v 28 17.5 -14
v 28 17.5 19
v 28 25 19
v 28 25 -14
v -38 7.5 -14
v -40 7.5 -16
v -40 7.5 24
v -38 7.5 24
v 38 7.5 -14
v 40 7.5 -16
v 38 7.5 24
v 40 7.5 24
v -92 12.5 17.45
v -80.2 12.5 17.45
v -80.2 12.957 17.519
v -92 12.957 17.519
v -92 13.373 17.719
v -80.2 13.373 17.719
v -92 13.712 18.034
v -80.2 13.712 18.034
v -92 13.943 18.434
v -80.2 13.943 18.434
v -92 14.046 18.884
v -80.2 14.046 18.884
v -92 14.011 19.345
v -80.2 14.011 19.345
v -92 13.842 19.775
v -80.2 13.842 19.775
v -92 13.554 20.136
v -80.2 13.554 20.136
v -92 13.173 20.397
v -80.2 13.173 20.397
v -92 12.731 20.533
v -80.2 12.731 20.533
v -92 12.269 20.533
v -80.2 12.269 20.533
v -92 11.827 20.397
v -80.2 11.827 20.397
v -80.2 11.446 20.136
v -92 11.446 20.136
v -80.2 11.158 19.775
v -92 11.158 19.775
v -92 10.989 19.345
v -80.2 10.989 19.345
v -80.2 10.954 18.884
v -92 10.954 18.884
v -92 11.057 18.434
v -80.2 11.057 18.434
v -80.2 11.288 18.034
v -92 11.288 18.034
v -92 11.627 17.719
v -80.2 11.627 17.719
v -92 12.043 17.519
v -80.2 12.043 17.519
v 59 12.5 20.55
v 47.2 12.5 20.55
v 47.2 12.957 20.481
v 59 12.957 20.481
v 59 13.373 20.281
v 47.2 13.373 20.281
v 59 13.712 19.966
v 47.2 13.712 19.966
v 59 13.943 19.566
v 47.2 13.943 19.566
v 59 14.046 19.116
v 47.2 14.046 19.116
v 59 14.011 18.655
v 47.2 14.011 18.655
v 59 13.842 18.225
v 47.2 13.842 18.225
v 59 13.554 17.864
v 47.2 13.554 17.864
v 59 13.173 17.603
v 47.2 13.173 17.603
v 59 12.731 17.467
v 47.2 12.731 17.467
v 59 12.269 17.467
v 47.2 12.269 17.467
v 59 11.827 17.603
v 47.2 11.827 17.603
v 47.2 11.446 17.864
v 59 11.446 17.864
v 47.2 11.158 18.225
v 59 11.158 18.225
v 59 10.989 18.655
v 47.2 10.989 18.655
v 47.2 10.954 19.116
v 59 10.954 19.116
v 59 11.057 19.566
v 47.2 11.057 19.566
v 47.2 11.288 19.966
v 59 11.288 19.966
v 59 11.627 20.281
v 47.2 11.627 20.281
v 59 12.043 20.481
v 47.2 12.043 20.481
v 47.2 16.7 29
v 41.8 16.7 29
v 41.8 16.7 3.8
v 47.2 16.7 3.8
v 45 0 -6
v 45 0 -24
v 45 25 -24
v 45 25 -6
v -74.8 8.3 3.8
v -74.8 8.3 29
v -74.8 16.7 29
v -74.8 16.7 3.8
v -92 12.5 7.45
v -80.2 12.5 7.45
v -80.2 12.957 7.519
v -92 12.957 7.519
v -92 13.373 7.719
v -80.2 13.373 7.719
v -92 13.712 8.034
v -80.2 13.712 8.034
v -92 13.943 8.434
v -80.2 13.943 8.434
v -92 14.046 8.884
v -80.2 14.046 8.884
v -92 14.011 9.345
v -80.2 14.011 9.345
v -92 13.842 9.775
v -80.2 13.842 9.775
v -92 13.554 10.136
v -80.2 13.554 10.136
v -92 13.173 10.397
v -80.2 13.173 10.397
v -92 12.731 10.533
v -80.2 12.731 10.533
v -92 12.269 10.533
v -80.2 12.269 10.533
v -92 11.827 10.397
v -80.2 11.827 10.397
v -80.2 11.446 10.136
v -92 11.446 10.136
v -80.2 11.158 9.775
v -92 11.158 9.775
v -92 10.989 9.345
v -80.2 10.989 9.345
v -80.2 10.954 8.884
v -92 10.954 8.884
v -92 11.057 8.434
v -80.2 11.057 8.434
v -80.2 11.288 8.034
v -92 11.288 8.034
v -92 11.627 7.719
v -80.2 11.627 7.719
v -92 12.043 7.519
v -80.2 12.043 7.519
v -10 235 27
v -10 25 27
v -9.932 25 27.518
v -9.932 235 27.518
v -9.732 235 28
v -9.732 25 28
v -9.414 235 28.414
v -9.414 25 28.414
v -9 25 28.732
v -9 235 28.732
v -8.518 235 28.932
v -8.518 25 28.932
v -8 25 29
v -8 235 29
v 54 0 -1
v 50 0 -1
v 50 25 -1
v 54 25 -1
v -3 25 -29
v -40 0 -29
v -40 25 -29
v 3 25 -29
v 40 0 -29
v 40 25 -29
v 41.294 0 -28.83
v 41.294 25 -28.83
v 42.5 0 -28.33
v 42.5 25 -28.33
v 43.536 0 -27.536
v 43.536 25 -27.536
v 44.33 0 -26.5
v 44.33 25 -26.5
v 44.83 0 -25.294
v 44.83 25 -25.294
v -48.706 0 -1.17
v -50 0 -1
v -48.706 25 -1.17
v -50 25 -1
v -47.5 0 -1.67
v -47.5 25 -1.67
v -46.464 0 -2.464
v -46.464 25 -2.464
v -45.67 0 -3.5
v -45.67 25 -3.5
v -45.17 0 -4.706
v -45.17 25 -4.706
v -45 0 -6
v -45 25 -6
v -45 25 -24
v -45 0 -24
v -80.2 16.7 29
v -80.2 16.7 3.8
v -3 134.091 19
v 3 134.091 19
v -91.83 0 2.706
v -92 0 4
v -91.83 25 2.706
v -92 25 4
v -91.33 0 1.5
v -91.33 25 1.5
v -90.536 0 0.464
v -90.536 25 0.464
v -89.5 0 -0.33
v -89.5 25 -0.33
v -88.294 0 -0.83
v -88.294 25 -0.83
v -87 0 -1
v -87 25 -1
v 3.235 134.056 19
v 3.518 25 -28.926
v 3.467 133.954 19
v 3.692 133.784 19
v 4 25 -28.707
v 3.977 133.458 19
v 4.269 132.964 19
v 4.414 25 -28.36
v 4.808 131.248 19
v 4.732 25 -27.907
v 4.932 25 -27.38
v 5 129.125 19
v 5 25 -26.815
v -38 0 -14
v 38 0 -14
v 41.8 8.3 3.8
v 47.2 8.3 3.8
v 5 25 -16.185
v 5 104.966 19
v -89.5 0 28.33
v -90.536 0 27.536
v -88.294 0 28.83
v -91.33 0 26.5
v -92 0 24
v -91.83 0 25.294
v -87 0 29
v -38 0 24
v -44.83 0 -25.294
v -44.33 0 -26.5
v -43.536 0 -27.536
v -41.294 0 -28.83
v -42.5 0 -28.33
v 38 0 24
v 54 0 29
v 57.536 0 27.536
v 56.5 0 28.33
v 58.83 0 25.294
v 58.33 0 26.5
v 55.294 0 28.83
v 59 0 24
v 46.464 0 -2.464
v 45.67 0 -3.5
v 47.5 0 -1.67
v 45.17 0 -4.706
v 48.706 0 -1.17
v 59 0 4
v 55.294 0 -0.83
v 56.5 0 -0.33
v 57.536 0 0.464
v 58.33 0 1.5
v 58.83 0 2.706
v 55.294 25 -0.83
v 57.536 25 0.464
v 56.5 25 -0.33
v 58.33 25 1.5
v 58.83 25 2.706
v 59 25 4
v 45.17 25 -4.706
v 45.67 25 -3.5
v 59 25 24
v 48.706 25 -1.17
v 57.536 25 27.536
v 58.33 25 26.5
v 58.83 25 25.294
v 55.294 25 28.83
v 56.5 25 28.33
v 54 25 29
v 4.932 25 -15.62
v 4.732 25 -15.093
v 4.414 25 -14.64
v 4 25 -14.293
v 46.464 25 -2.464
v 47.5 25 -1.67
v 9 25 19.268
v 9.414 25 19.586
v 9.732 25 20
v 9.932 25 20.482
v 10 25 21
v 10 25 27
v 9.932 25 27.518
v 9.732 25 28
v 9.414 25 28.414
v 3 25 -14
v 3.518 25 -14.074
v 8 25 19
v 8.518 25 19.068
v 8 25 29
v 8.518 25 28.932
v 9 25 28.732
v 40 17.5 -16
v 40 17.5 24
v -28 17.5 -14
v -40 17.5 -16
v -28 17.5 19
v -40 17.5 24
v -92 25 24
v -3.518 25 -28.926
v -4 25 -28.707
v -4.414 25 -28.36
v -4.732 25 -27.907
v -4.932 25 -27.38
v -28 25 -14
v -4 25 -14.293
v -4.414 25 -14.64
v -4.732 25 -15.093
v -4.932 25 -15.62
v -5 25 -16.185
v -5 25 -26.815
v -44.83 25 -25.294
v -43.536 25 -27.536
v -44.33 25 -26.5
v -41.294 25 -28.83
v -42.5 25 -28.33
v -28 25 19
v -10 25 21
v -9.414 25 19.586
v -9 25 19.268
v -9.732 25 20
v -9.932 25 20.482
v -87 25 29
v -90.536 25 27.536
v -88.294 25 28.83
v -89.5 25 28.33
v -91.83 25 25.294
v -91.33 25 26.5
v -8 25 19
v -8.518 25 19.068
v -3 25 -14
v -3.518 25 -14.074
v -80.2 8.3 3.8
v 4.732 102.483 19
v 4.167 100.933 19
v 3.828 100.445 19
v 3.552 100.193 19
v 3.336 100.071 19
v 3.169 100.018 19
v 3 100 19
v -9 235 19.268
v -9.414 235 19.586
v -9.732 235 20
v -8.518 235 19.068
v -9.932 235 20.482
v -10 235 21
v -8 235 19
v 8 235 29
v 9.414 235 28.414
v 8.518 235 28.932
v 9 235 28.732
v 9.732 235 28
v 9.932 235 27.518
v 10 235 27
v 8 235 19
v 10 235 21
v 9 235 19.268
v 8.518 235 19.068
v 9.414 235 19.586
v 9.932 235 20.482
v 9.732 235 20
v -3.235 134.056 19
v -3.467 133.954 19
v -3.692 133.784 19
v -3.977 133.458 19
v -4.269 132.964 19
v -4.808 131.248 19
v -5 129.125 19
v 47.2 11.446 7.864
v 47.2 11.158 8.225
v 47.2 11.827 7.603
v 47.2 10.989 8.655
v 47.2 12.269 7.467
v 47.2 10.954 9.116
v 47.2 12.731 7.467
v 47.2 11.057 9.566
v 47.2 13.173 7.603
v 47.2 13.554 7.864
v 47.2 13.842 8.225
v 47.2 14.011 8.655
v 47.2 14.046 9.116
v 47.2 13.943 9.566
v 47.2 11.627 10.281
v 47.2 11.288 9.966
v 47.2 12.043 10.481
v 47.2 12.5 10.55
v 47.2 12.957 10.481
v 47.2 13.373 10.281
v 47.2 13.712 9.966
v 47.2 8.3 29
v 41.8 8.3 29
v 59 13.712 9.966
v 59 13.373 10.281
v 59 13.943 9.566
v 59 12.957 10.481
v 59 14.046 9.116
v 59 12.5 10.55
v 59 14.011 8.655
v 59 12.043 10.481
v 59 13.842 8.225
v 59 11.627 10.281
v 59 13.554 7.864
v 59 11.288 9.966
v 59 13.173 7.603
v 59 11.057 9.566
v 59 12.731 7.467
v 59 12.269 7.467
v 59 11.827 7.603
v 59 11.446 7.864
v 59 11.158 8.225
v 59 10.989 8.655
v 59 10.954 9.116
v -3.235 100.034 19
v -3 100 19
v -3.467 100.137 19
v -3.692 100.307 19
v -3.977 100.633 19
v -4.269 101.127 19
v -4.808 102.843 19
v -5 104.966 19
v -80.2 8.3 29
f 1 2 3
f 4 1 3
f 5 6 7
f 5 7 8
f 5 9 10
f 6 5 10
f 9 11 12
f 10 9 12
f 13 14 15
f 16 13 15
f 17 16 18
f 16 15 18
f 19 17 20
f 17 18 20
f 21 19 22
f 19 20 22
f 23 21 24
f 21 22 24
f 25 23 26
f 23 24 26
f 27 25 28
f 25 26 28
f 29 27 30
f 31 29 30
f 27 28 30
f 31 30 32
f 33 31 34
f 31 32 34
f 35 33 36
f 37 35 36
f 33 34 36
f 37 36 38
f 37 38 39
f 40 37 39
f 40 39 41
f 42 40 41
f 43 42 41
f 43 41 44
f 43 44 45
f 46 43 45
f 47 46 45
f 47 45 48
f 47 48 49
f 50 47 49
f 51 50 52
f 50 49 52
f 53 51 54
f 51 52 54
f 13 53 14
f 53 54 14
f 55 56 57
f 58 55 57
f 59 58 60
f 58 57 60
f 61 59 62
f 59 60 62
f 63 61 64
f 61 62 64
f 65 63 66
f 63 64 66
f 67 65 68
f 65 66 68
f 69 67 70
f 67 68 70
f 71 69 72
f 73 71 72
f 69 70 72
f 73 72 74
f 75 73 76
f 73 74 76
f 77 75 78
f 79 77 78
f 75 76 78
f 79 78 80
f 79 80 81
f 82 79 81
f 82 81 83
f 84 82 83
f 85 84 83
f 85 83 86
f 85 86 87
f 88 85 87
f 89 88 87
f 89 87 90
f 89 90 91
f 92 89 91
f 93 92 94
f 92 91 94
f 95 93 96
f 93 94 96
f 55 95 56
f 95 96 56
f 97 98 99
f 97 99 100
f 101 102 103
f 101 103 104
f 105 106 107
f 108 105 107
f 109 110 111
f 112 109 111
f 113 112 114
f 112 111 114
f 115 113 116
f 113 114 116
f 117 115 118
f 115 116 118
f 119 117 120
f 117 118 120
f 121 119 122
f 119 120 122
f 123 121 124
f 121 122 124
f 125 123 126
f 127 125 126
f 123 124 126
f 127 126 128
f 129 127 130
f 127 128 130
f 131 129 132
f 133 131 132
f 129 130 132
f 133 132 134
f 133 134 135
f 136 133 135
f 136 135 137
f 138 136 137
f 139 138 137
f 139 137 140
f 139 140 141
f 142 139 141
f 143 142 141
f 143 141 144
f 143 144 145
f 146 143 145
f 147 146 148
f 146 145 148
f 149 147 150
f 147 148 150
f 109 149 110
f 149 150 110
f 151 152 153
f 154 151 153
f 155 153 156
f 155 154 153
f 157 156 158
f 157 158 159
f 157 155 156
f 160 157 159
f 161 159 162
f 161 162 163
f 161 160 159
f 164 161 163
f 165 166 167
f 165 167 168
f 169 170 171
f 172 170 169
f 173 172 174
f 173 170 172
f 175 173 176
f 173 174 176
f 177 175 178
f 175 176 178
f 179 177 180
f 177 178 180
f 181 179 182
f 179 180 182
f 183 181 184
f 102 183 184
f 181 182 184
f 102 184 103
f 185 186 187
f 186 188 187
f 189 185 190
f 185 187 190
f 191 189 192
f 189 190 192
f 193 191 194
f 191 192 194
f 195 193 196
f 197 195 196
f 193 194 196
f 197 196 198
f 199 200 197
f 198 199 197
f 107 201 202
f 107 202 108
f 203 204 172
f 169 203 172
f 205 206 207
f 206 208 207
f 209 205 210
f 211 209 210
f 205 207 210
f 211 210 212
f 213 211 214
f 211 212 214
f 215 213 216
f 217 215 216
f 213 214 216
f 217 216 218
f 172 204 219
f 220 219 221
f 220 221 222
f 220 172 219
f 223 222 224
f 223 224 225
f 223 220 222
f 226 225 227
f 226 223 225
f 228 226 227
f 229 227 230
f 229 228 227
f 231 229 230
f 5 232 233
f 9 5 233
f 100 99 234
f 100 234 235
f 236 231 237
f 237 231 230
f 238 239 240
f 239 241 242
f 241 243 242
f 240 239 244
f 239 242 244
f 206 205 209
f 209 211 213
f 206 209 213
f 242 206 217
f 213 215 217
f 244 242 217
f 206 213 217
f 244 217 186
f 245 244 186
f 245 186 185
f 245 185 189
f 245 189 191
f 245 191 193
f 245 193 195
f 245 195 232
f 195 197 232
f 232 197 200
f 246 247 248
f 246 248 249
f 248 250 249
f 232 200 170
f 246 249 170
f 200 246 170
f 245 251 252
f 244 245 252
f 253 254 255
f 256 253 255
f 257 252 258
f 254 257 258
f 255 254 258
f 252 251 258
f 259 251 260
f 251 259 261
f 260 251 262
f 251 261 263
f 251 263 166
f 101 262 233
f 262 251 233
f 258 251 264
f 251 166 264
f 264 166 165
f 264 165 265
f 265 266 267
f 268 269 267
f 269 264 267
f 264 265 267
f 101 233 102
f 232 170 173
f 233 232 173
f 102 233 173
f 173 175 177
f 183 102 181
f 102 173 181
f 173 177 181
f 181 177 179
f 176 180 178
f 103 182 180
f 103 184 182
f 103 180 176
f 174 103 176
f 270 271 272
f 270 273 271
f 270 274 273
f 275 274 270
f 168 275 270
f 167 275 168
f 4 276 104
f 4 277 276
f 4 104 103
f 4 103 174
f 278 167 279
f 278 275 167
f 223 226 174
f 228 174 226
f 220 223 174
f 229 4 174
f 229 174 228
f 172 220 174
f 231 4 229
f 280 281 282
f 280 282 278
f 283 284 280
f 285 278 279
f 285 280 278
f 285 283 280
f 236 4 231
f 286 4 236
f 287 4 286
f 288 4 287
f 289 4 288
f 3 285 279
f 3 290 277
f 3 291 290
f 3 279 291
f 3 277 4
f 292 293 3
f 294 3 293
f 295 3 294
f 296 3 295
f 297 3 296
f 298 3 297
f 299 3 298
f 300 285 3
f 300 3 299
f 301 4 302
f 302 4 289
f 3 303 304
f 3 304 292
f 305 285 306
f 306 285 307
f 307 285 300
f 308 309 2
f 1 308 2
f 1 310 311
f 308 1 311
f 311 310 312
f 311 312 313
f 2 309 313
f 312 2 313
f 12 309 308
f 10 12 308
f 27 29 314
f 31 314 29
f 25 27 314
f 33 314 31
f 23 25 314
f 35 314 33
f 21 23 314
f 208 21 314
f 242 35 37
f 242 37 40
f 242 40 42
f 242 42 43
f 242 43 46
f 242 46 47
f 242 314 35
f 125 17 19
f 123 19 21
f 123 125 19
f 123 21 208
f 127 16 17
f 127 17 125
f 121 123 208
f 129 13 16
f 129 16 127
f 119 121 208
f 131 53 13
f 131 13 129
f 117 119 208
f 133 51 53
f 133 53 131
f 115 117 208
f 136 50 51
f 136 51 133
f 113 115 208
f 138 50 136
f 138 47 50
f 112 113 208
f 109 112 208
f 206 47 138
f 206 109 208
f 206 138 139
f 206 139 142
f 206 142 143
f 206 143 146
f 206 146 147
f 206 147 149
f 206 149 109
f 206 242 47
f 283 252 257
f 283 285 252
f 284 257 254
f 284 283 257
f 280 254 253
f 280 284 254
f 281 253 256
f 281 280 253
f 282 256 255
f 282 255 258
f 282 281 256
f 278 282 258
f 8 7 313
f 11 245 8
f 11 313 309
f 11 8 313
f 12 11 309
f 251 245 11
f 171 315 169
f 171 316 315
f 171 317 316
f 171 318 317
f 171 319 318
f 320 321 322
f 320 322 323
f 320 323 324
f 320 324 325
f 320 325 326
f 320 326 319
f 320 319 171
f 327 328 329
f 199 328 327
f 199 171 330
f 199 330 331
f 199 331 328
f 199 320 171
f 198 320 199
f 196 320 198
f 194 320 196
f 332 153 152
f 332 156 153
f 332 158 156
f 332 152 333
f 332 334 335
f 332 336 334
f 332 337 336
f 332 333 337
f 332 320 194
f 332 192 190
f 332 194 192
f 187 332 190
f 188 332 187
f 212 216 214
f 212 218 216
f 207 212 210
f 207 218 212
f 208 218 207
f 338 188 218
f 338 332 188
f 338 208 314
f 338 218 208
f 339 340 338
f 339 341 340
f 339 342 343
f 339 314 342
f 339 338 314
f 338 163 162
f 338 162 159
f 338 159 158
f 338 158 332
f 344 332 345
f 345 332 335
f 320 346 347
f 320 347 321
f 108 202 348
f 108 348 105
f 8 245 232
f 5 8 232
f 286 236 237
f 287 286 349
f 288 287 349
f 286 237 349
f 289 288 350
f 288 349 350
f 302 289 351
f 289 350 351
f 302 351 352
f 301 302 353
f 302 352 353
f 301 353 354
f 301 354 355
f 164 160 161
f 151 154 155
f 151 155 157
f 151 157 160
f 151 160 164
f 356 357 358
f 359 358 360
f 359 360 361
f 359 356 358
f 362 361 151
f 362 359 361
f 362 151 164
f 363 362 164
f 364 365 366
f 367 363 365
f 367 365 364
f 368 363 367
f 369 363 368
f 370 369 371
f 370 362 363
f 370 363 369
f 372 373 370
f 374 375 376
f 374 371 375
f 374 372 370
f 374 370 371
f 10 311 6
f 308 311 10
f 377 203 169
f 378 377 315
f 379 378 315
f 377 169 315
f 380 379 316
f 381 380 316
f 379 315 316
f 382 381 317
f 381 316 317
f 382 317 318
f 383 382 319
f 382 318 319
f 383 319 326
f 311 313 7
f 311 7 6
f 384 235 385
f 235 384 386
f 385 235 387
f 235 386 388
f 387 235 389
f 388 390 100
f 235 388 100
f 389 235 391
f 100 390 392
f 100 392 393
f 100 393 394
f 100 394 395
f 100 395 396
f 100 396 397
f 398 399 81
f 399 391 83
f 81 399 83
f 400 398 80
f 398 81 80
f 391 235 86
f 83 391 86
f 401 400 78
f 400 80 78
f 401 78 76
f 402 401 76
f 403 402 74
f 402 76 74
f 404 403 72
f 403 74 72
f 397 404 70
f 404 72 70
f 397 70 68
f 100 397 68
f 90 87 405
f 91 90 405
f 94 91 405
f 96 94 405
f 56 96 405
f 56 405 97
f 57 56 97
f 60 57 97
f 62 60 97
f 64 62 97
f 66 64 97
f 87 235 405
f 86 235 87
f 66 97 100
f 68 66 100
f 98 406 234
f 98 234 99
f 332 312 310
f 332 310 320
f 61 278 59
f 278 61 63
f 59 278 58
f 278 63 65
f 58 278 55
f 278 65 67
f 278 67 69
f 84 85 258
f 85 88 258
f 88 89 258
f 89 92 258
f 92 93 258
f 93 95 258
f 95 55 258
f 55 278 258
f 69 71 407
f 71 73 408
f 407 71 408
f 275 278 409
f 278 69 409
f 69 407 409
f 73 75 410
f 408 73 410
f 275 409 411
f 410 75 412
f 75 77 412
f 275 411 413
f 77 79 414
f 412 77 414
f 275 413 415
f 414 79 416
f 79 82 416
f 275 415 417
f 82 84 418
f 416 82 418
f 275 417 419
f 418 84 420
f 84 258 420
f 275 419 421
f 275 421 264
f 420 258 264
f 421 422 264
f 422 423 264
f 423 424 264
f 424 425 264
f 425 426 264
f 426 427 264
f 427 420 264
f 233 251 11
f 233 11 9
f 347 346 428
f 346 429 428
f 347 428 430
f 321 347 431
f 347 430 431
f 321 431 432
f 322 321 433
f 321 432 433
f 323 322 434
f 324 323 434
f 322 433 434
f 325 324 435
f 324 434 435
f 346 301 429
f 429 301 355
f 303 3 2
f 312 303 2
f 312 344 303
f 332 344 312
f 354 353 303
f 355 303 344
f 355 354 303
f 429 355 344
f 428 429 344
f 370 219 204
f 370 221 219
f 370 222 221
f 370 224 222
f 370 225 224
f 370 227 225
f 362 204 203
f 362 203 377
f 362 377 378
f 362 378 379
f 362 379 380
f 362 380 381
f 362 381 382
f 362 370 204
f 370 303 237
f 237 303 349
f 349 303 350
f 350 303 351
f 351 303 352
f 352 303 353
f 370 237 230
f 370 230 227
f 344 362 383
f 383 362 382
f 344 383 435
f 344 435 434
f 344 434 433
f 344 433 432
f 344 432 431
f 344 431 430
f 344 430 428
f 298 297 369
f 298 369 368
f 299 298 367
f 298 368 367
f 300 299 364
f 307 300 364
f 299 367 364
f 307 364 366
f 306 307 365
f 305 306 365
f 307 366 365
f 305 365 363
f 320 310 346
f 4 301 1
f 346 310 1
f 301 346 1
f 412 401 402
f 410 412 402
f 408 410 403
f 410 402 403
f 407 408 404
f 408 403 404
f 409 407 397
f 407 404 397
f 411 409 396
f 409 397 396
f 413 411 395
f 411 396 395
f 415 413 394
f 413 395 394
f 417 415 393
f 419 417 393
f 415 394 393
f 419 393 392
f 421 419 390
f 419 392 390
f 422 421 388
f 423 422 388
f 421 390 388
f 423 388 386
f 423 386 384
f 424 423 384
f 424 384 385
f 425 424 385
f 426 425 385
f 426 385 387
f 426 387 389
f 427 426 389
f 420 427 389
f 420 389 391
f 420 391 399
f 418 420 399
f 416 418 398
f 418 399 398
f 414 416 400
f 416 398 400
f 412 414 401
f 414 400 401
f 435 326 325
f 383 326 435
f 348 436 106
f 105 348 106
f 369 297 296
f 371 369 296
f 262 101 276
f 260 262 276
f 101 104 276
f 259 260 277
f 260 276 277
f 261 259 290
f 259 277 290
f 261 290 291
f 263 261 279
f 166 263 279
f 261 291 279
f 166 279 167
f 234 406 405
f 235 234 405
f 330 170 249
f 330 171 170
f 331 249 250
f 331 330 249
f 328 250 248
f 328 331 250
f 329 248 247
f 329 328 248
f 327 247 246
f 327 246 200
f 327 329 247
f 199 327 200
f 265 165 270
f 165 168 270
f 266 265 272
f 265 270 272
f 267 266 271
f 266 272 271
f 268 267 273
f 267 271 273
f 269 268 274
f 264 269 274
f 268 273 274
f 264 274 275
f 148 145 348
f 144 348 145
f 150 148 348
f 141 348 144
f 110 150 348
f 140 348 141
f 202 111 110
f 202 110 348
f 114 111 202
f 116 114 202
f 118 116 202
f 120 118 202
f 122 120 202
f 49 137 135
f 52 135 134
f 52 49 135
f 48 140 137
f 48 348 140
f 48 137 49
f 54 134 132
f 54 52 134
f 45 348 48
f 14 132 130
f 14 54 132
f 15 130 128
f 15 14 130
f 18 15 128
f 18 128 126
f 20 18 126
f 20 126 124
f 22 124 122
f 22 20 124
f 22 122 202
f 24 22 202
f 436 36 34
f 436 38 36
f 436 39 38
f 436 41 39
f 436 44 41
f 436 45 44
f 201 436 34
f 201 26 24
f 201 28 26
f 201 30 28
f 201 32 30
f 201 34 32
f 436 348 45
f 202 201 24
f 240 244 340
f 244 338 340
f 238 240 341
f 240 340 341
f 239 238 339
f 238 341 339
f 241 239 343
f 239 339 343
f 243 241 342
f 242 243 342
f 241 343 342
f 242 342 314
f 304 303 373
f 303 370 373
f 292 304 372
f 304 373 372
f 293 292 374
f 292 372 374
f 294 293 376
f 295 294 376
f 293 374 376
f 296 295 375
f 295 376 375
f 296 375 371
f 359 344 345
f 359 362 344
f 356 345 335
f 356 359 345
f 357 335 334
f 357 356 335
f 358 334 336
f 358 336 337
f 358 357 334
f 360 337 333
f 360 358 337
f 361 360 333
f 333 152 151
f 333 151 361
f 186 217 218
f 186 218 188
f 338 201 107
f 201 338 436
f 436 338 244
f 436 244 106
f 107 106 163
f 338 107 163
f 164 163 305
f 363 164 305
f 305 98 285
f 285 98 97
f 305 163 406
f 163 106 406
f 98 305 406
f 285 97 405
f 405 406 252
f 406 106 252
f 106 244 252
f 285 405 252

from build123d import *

# Parameters (mm, degrees)
SKETCH1_W                  = 151
SKETCH1_H                  = 58
SKETCH1_W_2                = 76
SKETCH1_H_2                = 38
BOSS_EXTRUDE1_DEPTH        = 25
SKETCH2_W                  = 76
SKETCH2_H                  = 10
CUT_EXTRUDE1_DEPTH         = 2
SKETCH3_W                  = 40
SKETCH3_H                  = 10
CUT_EXTRUDE2_DEPTH         = 2
SKETCH4_W                  = 76
SKETCH4_H                  = 7.5
BOSS_EXTRUDE2_DEPTH        = 5
SKETCH6_W                  = 20
SKETCH6_H                  = 10
BOSS_EXTRUDE3_DEPTH        = 210
SKETCH7_W                  = 10
SKETCH7_H                  = 7.5
BOSS_EXTRUDE4_DEPTH        = 33
BOSS_EXTRUDE5_DEPTH        = 5
FILLET2_R                  = 2
M2_5_CLEARANCE_HOLE1_D     = 3.1
M2_5_CLEARANCE_HOLE1_DEPTH = 16.068666041
M2_5_CLEARANCE_HOLE1_TIP   = 0.931333959
M2_5_CLEARANCE_HOLE2_D     = 3.1
M2_5_CLEARANCE_HOLE2_DEPTH = 16.068666041
M2_5_CLEARANCE_HOLE2_TIP   = 0.931333959
SKETCH19_W                 = 5
SKETCH19_H                 = 8
SKETCH19_W_2               = 5.4
SKETCH19_H_2               = 8.4
CUT_EXTRUDE4_DEPTH         = 25.2
SKETCH25_W                 = 47
SKETCH25_H                 = 28
SKETCH25_W_2               = 14
CUT_EXTRUDE5_DEPTH         = 255.02755756
FILLET3_R                  = 5


with BuildPart() as part:
    # Sketch1 → Boss-Extrude1 (new body)
    with BuildSketch(Plane(origin=(0, 0, 0), x_dir=(1, 0, 0), z_dir=(0, 1, 0))):
        with Locations((-16.5, 0)):
            Rectangle(SKETCH1_W, SKETCH1_H)
        with Locations((0, -5)):
            Rectangle(SKETCH1_W_2, SKETCH1_H_2, mode=Mode.SUBTRACT)
    extrude(amount=BOSS_EXTRUDE1_DEPTH)

    # Sketch2 → Cut-Extrude1 (cut)
    with BuildSketch(Plane.XY.offset(-14)):
        with Locations((0, 12.5)):
            Rectangle(SKETCH2_W, SKETCH2_H)
    extrude(amount=-CUT_EXTRUDE1_DEPTH, mode=Mode.SUBTRACT)

    # Sketch3 → Cut-Extrude2 (cut)
    with BuildSketch(Plane(origin=(-38, 0, 0), x_dir=(0, 0, -1), z_dir=(1, 0, 0))):
        with Locations((-4, 12.5)):
            Rectangle(SKETCH3_W, SKETCH3_H)
    cut_extrude2 = extrude(amount=-CUT_EXTRUDE2_DEPTH, mode=Mode.SUBTRACT)

    # Mirror1: Cut-Extrude2 across plane
    add(cut_extrude2.mirror(Plane(origin=(0, 0, 0), x_dir=(0, 0, 1), z_dir=(1, 0, 0))), mode=Mode.SUBTRACT)

    # Sketch4 → Boss-Extrude2 (add)
    with BuildSketch(Plane(origin=(0, 0, 24), x_dir=(-1, 0, 0), z_dir=(0, 0, -1))):
        with Locations((0, 21.25)):
            Rectangle(SKETCH4_W, SKETCH4_H)
    extrude(amount=BOSS_EXTRUDE2_DEPTH)

    # Sketch6 → Boss-Extrude3 (add)
    with BuildSketch(Plane(origin=(0, 25, 0), x_dir=(1, 0, 0), z_dir=(0, 1, 0))):
        with Locations((0, -24)):
            Rectangle(SKETCH6_W, SKETCH6_H)
    extrude(amount=BOSS_EXTRUDE3_DEPTH)

    # Sketch7 → Boss-Extrude4 (add)
    with BuildSketch(Plane(origin=(0, 0, 19), x_dir=(-1, 0, 0), z_dir=(0, 0, -1))):
        with Locations((-33, 21.25)):
            Rectangle(SKETCH7_W, SKETCH7_H)
        with Locations((33, 21.25)):
            Rectangle(SKETCH7_W, SKETCH7_H)
    extrude(amount=BOSS_EXTRUDE4_DEPTH)

    # Sketch8 → Boss-Extrude5 (add, symmetric)
    with BuildSketch(Plane(origin=(0, 0, 0), x_dir=(0, 0, -1), z_dir=(1, 0, 0))):
        Polygon((-19, 134.090909091), (29, 25), (14, 25), (-19, 100), align=None)
    extrude(amount=BOSS_EXTRUDE5_DEPTH, both=True)

    # Fillet2
    fillet2_edges = [part.edges().sort_by_distance(p)[0] for p in [
        (-5, 62.5, 2.5),
        (-5, 79.545454545, -5),
        (5, 62.5, 2.5),
        (5, 79.545454545, -5),
        (10, 130, 29),
        (10, 130, 19),
        (-10, 130, 19),
        (-10, 130, 29),
    ]]
    fillet(fillet2_edges, radius=FILLET2_R)

    # M2.5 Clearance Hole1
    with Locations(Plane(origin=(59, 0, 0), x_dir=(0, 0, -1), z_dir=(1, 0, 0))):
        with Locations((-19, 12.5), (-9, 12.5)):
            Hole(M2_5_CLEARANCE_HOLE1_D / 2, depth=M2_5_CLEARANCE_HOLE1_DEPTH)
            with Locations((0, 0, -(M2_5_CLEARANCE_HOLE1_DEPTH + M2_5_CLEARANCE_HOLE1_TIP / 2))):  # 118° drill point
                Cone(0, M2_5_CLEARANCE_HOLE1_D / 2, M2_5_CLEARANCE_HOLE1_TIP, mode=Mode.SUBTRACT)

    # M2.5 Clearance Hole2
    with Locations(Plane.ZY.offset(92)):
        with Locations((9, 12.5), (19, 12.5)):
            Hole(M2_5_CLEARANCE_HOLE2_D / 2, depth=M2_5_CLEARANCE_HOLE2_DEPTH)
            with Locations((0, 0, -(M2_5_CLEARANCE_HOLE2_DEPTH + M2_5_CLEARANCE_HOLE2_TIP / 2))):  # 118° drill point
                Cone(0, M2_5_CLEARANCE_HOLE2_D / 2, M2_5_CLEARANCE_HOLE2_TIP, mode=Mode.SUBTRACT)

    # Sketch19 → Cut-Extrude4 (cut)
    with BuildSketch(Plane.XY.offset(29)):
        with Locations((44.5, 12.5)):
            Rectangle(SKETCH19_W, SKETCH19_H)
        with Locations((44.5, 12.5)):
            Rectangle(SKETCH19_W_2, SKETCH19_H_2)
        with Locations((-77.5, 12.5)):
            Rectangle(SKETCH19_W_2, SKETCH19_H_2)
    extrude(amount=-CUT_EXTRUDE4_DEPTH, mode=Mode.SUBTRACT)

    # Sketch25 → Cut-Extrude5 (cut, through all)
    with BuildSketch(Plane.XZ):
        with Locations((-68.5, -15)):
            Rectangle(SKETCH25_W, SKETCH25_H)
        with Locations((52, -15)):
            Rectangle(SKETCH25_W_2, SKETCH25_H)
    extrude(amount=-CUT_EXTRUDE5_DEPTH, mode=Mode.SUBTRACT)

    # Fillet3
    fillet3_edges = [part.edges().sort_by_distance(p)[0] for p in [
        (-92, 12.5, -1),
        (45, 12.5, -29),
        (-45, 12.5, -1),
        (-45, 12.5, -29),
        (45, 12.5, -1),
        (59, 12.5, -1),
        (59, 12.5, 29),
        (-92, 12.5, 29),
    ]]
    fillet(fillet3_edges, radius=FILLET3_R)


solid = part.part
